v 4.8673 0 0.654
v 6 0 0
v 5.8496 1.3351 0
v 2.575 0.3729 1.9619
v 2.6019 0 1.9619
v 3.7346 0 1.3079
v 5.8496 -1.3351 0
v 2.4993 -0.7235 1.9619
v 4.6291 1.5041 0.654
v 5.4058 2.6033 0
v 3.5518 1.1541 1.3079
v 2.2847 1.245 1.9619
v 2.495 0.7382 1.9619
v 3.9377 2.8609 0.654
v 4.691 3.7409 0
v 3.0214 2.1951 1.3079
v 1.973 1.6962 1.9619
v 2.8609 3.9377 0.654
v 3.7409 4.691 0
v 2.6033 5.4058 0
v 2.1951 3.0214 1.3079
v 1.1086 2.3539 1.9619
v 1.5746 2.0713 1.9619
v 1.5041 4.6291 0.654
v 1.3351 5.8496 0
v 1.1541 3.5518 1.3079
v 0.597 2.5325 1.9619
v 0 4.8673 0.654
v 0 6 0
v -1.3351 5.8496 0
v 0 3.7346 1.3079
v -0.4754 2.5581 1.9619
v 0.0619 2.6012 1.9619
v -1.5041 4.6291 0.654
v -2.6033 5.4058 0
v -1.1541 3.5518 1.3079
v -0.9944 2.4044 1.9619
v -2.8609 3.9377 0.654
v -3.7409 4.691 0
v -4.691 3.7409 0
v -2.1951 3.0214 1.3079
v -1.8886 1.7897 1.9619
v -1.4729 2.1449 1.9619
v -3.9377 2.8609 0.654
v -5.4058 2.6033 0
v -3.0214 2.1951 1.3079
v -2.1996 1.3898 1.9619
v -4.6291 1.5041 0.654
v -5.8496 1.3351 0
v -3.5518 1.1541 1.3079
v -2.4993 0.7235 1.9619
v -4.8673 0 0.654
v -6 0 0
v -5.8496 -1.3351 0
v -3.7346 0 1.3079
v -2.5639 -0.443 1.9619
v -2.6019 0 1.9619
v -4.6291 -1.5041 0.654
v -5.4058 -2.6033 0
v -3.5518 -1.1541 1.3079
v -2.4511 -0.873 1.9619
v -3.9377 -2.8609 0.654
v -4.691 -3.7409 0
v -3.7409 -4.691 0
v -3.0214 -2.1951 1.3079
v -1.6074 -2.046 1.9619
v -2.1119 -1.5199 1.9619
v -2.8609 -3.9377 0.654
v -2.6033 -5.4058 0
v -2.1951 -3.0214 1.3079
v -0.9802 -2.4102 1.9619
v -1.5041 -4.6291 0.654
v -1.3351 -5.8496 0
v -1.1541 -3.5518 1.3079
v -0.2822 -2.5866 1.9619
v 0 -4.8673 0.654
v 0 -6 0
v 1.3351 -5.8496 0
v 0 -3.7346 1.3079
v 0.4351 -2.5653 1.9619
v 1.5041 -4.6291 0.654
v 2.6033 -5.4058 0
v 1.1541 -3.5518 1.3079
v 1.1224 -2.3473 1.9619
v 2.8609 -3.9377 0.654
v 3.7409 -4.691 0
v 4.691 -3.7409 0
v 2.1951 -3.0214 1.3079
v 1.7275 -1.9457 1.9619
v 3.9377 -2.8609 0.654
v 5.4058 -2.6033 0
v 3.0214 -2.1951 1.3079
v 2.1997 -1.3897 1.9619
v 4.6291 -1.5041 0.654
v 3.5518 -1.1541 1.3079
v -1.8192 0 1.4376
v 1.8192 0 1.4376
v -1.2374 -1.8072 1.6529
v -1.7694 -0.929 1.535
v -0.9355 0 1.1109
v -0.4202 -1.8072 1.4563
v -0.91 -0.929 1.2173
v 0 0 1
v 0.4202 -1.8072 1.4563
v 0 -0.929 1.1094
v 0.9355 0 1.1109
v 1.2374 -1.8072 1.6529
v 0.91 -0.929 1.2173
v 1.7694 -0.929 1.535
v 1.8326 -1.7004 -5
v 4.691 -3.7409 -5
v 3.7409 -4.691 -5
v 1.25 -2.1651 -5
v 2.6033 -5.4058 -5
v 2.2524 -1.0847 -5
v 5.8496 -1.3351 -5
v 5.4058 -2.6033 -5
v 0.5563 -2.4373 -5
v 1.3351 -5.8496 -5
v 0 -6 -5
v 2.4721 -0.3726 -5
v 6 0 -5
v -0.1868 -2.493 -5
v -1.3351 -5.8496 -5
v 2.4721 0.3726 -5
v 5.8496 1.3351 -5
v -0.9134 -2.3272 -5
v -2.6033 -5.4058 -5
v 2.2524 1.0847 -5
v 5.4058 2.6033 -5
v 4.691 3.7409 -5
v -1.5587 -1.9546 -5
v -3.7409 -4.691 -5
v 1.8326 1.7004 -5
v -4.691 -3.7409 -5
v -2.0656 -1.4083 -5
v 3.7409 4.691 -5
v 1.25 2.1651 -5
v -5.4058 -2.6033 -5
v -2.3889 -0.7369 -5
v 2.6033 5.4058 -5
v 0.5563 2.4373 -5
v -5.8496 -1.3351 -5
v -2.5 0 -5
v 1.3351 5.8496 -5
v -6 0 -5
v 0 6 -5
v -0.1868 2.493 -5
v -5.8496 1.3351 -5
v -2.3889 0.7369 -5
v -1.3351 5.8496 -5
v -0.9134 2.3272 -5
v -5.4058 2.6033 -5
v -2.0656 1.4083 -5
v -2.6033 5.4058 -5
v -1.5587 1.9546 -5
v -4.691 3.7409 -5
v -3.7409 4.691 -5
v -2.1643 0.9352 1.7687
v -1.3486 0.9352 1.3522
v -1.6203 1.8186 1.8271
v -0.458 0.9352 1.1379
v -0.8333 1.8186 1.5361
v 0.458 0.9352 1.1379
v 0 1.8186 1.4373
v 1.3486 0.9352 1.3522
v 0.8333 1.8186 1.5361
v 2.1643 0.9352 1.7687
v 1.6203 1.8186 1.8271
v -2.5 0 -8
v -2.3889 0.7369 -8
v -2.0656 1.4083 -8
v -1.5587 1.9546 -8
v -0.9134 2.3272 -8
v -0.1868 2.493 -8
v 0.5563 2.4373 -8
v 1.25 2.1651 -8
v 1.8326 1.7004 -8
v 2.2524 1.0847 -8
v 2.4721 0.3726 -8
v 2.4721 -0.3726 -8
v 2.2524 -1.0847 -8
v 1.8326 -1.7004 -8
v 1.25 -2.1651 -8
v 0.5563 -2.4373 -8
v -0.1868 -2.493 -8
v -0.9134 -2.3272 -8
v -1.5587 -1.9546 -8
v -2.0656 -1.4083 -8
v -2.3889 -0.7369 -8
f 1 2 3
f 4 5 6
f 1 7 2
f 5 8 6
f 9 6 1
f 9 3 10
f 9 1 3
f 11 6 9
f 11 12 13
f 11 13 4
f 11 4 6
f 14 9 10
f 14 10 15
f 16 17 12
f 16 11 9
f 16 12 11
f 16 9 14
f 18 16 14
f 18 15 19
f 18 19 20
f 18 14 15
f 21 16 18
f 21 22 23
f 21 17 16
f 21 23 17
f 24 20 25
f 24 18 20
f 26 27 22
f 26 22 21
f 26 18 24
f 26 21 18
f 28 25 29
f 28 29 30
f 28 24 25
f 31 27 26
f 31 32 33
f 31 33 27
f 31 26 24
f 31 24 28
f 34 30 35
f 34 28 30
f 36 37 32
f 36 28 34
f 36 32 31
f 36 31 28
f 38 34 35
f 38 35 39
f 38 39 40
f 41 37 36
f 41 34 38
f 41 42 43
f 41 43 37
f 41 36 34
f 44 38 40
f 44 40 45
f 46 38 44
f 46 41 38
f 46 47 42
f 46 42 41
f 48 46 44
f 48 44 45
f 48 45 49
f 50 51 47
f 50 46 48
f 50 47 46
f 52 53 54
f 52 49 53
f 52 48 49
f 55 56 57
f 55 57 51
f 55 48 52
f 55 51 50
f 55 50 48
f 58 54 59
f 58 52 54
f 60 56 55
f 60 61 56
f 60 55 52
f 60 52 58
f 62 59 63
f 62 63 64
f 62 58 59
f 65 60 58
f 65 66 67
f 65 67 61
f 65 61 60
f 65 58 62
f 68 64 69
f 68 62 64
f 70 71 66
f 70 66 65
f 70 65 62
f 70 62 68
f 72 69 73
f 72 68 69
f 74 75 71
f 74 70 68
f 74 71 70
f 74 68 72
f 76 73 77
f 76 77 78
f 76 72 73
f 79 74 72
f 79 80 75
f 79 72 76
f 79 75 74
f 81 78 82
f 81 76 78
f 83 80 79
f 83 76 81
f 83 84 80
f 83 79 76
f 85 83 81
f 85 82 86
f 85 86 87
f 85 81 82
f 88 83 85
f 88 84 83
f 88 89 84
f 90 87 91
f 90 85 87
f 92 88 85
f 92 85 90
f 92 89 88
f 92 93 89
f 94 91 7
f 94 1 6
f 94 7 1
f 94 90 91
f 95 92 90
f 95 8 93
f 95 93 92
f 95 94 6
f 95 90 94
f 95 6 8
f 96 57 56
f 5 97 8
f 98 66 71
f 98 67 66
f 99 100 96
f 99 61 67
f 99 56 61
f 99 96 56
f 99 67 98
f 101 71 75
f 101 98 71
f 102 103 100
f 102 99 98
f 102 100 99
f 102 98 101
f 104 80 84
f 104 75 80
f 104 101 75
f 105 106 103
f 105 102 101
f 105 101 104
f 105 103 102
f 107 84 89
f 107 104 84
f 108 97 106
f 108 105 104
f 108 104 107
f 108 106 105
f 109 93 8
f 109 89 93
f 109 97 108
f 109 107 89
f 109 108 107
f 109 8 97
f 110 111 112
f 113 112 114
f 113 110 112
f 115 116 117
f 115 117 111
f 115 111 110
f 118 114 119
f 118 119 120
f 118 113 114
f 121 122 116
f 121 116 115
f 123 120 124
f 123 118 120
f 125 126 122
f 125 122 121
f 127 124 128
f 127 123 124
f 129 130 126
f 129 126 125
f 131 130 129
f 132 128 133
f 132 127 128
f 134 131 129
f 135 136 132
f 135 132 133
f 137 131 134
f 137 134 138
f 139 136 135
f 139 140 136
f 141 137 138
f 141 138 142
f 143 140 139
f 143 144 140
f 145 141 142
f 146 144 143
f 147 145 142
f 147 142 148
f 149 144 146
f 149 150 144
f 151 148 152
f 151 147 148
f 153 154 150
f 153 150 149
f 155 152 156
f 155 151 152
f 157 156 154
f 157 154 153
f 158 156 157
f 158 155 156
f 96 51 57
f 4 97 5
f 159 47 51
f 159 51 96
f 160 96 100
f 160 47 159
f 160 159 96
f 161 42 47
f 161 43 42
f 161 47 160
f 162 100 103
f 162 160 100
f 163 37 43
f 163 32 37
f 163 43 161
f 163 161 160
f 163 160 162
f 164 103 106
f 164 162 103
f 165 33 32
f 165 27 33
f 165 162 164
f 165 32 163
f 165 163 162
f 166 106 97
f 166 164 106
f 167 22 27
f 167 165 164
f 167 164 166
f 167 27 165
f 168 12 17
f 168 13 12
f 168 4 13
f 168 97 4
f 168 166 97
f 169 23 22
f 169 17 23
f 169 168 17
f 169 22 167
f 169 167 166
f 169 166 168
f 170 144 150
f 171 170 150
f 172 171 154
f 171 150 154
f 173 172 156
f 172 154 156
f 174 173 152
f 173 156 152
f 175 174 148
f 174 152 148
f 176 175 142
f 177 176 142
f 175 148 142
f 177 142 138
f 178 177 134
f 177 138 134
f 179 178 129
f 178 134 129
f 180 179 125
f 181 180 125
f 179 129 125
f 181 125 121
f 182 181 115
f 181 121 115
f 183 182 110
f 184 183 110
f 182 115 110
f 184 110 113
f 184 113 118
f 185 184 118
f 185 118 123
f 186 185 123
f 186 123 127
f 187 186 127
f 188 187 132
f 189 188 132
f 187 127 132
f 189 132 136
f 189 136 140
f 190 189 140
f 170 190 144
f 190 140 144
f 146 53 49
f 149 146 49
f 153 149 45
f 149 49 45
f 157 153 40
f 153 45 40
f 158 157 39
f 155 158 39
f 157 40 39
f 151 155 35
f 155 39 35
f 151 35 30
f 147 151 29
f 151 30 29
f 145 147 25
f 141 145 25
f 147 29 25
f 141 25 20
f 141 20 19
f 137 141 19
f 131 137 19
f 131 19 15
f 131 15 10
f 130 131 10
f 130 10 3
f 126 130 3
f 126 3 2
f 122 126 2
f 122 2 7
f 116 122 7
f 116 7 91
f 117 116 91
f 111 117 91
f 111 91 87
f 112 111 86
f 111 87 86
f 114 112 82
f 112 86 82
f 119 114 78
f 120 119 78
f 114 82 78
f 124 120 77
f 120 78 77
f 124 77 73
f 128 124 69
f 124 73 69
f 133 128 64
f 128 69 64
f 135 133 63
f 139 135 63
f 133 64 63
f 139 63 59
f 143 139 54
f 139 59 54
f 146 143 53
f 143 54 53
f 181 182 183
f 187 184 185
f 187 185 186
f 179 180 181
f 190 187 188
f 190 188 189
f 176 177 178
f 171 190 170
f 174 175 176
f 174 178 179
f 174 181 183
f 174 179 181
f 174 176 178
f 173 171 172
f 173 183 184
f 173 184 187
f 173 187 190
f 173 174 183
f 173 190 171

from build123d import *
from build123d.topology import SkipClean

# Parameters (mm, degrees)
SKETCH2_R           = 6
BOSS_EXTRUDE1_DEPTH = 2
CHAMFER1_SIZE       = 2
CHAMFER1_SIZE_2     = 3.464101615
SKETCH4_R           = 6
BOSS_EXTRUDE2_DEPTH = 5
SKETCH6_R           = 2.5
BOSS_EXTRUDE3_DEPTH = 3


with BuildPart() as part:
    # Sketch2 → Boss-Extrude1 (new body)
    with BuildSketch(Plane.XY):
        Circle(SKETCH2_R)
    extrude(amount=BOSS_EXTRUDE1_DEPTH)

    # Sketch3 one side → Cut-Revolve1 (revolve, cut)
    with SkipClean():  # the faces are left unmerged after this step: merging them gives an invalid solid
        with BuildSketch(Plane(origin=(0, 0, 0), x_dir=(0, 0, -1), z_dir=(1, 0, 0))):
            with BuildLine():
                ThreePointArc((-5, -4), (-2.171572875, -2.828427125), (-1, 0))
                ThreePointArc((-1, 0), (-2.171572875, 2.828427125), (-5, 4))
                Line((-5, 4), (-5, -4))
            make_face()
        revolve(axis=Axis((0, 4, 5), (0, -1, 0)), mode=Mode.SUBTRACT)

    # Chamfer1
    # the kernel refuses this chamfer: 3.464101615, 2 mm, written as the material it takes off along each edge
    with BuildSketch(Plane(origin=(0, 0, 2), x_dir=(1, 0, 0), z_dir=(0, -1, 0))) as chamfer1_piece_1:
        Polygon((6, -CHAMFER1_SIZE), (6 - CHAMFER1_SIZE_2, 0), (6, 0), align=None)
    revolve(axis=Axis((0, 0, 2), (0, 0, 1)), mode=Mode.SUBTRACT)

    # Sketch4 → Boss-Extrude2 (add)
    with BuildSketch(Plane(origin=(0, 0, 0), x_dir=(-1, 0, 0), z_dir=(0, 0, -1))):
        Circle(SKETCH4_R)
    extrude(amount=BOSS_EXTRUDE2_DEPTH)

    # Sketch6 → Boss-Extrude3 (add)
    with BuildSketch(Plane(origin=(0, 0, -5), x_dir=(-1, 0, 0), z_dir=(0, 0, -1))):
        Circle(SKETCH6_R)
    extrude(amount=BOSS_EXTRUDE3_DEPTH)


solid = part.part
